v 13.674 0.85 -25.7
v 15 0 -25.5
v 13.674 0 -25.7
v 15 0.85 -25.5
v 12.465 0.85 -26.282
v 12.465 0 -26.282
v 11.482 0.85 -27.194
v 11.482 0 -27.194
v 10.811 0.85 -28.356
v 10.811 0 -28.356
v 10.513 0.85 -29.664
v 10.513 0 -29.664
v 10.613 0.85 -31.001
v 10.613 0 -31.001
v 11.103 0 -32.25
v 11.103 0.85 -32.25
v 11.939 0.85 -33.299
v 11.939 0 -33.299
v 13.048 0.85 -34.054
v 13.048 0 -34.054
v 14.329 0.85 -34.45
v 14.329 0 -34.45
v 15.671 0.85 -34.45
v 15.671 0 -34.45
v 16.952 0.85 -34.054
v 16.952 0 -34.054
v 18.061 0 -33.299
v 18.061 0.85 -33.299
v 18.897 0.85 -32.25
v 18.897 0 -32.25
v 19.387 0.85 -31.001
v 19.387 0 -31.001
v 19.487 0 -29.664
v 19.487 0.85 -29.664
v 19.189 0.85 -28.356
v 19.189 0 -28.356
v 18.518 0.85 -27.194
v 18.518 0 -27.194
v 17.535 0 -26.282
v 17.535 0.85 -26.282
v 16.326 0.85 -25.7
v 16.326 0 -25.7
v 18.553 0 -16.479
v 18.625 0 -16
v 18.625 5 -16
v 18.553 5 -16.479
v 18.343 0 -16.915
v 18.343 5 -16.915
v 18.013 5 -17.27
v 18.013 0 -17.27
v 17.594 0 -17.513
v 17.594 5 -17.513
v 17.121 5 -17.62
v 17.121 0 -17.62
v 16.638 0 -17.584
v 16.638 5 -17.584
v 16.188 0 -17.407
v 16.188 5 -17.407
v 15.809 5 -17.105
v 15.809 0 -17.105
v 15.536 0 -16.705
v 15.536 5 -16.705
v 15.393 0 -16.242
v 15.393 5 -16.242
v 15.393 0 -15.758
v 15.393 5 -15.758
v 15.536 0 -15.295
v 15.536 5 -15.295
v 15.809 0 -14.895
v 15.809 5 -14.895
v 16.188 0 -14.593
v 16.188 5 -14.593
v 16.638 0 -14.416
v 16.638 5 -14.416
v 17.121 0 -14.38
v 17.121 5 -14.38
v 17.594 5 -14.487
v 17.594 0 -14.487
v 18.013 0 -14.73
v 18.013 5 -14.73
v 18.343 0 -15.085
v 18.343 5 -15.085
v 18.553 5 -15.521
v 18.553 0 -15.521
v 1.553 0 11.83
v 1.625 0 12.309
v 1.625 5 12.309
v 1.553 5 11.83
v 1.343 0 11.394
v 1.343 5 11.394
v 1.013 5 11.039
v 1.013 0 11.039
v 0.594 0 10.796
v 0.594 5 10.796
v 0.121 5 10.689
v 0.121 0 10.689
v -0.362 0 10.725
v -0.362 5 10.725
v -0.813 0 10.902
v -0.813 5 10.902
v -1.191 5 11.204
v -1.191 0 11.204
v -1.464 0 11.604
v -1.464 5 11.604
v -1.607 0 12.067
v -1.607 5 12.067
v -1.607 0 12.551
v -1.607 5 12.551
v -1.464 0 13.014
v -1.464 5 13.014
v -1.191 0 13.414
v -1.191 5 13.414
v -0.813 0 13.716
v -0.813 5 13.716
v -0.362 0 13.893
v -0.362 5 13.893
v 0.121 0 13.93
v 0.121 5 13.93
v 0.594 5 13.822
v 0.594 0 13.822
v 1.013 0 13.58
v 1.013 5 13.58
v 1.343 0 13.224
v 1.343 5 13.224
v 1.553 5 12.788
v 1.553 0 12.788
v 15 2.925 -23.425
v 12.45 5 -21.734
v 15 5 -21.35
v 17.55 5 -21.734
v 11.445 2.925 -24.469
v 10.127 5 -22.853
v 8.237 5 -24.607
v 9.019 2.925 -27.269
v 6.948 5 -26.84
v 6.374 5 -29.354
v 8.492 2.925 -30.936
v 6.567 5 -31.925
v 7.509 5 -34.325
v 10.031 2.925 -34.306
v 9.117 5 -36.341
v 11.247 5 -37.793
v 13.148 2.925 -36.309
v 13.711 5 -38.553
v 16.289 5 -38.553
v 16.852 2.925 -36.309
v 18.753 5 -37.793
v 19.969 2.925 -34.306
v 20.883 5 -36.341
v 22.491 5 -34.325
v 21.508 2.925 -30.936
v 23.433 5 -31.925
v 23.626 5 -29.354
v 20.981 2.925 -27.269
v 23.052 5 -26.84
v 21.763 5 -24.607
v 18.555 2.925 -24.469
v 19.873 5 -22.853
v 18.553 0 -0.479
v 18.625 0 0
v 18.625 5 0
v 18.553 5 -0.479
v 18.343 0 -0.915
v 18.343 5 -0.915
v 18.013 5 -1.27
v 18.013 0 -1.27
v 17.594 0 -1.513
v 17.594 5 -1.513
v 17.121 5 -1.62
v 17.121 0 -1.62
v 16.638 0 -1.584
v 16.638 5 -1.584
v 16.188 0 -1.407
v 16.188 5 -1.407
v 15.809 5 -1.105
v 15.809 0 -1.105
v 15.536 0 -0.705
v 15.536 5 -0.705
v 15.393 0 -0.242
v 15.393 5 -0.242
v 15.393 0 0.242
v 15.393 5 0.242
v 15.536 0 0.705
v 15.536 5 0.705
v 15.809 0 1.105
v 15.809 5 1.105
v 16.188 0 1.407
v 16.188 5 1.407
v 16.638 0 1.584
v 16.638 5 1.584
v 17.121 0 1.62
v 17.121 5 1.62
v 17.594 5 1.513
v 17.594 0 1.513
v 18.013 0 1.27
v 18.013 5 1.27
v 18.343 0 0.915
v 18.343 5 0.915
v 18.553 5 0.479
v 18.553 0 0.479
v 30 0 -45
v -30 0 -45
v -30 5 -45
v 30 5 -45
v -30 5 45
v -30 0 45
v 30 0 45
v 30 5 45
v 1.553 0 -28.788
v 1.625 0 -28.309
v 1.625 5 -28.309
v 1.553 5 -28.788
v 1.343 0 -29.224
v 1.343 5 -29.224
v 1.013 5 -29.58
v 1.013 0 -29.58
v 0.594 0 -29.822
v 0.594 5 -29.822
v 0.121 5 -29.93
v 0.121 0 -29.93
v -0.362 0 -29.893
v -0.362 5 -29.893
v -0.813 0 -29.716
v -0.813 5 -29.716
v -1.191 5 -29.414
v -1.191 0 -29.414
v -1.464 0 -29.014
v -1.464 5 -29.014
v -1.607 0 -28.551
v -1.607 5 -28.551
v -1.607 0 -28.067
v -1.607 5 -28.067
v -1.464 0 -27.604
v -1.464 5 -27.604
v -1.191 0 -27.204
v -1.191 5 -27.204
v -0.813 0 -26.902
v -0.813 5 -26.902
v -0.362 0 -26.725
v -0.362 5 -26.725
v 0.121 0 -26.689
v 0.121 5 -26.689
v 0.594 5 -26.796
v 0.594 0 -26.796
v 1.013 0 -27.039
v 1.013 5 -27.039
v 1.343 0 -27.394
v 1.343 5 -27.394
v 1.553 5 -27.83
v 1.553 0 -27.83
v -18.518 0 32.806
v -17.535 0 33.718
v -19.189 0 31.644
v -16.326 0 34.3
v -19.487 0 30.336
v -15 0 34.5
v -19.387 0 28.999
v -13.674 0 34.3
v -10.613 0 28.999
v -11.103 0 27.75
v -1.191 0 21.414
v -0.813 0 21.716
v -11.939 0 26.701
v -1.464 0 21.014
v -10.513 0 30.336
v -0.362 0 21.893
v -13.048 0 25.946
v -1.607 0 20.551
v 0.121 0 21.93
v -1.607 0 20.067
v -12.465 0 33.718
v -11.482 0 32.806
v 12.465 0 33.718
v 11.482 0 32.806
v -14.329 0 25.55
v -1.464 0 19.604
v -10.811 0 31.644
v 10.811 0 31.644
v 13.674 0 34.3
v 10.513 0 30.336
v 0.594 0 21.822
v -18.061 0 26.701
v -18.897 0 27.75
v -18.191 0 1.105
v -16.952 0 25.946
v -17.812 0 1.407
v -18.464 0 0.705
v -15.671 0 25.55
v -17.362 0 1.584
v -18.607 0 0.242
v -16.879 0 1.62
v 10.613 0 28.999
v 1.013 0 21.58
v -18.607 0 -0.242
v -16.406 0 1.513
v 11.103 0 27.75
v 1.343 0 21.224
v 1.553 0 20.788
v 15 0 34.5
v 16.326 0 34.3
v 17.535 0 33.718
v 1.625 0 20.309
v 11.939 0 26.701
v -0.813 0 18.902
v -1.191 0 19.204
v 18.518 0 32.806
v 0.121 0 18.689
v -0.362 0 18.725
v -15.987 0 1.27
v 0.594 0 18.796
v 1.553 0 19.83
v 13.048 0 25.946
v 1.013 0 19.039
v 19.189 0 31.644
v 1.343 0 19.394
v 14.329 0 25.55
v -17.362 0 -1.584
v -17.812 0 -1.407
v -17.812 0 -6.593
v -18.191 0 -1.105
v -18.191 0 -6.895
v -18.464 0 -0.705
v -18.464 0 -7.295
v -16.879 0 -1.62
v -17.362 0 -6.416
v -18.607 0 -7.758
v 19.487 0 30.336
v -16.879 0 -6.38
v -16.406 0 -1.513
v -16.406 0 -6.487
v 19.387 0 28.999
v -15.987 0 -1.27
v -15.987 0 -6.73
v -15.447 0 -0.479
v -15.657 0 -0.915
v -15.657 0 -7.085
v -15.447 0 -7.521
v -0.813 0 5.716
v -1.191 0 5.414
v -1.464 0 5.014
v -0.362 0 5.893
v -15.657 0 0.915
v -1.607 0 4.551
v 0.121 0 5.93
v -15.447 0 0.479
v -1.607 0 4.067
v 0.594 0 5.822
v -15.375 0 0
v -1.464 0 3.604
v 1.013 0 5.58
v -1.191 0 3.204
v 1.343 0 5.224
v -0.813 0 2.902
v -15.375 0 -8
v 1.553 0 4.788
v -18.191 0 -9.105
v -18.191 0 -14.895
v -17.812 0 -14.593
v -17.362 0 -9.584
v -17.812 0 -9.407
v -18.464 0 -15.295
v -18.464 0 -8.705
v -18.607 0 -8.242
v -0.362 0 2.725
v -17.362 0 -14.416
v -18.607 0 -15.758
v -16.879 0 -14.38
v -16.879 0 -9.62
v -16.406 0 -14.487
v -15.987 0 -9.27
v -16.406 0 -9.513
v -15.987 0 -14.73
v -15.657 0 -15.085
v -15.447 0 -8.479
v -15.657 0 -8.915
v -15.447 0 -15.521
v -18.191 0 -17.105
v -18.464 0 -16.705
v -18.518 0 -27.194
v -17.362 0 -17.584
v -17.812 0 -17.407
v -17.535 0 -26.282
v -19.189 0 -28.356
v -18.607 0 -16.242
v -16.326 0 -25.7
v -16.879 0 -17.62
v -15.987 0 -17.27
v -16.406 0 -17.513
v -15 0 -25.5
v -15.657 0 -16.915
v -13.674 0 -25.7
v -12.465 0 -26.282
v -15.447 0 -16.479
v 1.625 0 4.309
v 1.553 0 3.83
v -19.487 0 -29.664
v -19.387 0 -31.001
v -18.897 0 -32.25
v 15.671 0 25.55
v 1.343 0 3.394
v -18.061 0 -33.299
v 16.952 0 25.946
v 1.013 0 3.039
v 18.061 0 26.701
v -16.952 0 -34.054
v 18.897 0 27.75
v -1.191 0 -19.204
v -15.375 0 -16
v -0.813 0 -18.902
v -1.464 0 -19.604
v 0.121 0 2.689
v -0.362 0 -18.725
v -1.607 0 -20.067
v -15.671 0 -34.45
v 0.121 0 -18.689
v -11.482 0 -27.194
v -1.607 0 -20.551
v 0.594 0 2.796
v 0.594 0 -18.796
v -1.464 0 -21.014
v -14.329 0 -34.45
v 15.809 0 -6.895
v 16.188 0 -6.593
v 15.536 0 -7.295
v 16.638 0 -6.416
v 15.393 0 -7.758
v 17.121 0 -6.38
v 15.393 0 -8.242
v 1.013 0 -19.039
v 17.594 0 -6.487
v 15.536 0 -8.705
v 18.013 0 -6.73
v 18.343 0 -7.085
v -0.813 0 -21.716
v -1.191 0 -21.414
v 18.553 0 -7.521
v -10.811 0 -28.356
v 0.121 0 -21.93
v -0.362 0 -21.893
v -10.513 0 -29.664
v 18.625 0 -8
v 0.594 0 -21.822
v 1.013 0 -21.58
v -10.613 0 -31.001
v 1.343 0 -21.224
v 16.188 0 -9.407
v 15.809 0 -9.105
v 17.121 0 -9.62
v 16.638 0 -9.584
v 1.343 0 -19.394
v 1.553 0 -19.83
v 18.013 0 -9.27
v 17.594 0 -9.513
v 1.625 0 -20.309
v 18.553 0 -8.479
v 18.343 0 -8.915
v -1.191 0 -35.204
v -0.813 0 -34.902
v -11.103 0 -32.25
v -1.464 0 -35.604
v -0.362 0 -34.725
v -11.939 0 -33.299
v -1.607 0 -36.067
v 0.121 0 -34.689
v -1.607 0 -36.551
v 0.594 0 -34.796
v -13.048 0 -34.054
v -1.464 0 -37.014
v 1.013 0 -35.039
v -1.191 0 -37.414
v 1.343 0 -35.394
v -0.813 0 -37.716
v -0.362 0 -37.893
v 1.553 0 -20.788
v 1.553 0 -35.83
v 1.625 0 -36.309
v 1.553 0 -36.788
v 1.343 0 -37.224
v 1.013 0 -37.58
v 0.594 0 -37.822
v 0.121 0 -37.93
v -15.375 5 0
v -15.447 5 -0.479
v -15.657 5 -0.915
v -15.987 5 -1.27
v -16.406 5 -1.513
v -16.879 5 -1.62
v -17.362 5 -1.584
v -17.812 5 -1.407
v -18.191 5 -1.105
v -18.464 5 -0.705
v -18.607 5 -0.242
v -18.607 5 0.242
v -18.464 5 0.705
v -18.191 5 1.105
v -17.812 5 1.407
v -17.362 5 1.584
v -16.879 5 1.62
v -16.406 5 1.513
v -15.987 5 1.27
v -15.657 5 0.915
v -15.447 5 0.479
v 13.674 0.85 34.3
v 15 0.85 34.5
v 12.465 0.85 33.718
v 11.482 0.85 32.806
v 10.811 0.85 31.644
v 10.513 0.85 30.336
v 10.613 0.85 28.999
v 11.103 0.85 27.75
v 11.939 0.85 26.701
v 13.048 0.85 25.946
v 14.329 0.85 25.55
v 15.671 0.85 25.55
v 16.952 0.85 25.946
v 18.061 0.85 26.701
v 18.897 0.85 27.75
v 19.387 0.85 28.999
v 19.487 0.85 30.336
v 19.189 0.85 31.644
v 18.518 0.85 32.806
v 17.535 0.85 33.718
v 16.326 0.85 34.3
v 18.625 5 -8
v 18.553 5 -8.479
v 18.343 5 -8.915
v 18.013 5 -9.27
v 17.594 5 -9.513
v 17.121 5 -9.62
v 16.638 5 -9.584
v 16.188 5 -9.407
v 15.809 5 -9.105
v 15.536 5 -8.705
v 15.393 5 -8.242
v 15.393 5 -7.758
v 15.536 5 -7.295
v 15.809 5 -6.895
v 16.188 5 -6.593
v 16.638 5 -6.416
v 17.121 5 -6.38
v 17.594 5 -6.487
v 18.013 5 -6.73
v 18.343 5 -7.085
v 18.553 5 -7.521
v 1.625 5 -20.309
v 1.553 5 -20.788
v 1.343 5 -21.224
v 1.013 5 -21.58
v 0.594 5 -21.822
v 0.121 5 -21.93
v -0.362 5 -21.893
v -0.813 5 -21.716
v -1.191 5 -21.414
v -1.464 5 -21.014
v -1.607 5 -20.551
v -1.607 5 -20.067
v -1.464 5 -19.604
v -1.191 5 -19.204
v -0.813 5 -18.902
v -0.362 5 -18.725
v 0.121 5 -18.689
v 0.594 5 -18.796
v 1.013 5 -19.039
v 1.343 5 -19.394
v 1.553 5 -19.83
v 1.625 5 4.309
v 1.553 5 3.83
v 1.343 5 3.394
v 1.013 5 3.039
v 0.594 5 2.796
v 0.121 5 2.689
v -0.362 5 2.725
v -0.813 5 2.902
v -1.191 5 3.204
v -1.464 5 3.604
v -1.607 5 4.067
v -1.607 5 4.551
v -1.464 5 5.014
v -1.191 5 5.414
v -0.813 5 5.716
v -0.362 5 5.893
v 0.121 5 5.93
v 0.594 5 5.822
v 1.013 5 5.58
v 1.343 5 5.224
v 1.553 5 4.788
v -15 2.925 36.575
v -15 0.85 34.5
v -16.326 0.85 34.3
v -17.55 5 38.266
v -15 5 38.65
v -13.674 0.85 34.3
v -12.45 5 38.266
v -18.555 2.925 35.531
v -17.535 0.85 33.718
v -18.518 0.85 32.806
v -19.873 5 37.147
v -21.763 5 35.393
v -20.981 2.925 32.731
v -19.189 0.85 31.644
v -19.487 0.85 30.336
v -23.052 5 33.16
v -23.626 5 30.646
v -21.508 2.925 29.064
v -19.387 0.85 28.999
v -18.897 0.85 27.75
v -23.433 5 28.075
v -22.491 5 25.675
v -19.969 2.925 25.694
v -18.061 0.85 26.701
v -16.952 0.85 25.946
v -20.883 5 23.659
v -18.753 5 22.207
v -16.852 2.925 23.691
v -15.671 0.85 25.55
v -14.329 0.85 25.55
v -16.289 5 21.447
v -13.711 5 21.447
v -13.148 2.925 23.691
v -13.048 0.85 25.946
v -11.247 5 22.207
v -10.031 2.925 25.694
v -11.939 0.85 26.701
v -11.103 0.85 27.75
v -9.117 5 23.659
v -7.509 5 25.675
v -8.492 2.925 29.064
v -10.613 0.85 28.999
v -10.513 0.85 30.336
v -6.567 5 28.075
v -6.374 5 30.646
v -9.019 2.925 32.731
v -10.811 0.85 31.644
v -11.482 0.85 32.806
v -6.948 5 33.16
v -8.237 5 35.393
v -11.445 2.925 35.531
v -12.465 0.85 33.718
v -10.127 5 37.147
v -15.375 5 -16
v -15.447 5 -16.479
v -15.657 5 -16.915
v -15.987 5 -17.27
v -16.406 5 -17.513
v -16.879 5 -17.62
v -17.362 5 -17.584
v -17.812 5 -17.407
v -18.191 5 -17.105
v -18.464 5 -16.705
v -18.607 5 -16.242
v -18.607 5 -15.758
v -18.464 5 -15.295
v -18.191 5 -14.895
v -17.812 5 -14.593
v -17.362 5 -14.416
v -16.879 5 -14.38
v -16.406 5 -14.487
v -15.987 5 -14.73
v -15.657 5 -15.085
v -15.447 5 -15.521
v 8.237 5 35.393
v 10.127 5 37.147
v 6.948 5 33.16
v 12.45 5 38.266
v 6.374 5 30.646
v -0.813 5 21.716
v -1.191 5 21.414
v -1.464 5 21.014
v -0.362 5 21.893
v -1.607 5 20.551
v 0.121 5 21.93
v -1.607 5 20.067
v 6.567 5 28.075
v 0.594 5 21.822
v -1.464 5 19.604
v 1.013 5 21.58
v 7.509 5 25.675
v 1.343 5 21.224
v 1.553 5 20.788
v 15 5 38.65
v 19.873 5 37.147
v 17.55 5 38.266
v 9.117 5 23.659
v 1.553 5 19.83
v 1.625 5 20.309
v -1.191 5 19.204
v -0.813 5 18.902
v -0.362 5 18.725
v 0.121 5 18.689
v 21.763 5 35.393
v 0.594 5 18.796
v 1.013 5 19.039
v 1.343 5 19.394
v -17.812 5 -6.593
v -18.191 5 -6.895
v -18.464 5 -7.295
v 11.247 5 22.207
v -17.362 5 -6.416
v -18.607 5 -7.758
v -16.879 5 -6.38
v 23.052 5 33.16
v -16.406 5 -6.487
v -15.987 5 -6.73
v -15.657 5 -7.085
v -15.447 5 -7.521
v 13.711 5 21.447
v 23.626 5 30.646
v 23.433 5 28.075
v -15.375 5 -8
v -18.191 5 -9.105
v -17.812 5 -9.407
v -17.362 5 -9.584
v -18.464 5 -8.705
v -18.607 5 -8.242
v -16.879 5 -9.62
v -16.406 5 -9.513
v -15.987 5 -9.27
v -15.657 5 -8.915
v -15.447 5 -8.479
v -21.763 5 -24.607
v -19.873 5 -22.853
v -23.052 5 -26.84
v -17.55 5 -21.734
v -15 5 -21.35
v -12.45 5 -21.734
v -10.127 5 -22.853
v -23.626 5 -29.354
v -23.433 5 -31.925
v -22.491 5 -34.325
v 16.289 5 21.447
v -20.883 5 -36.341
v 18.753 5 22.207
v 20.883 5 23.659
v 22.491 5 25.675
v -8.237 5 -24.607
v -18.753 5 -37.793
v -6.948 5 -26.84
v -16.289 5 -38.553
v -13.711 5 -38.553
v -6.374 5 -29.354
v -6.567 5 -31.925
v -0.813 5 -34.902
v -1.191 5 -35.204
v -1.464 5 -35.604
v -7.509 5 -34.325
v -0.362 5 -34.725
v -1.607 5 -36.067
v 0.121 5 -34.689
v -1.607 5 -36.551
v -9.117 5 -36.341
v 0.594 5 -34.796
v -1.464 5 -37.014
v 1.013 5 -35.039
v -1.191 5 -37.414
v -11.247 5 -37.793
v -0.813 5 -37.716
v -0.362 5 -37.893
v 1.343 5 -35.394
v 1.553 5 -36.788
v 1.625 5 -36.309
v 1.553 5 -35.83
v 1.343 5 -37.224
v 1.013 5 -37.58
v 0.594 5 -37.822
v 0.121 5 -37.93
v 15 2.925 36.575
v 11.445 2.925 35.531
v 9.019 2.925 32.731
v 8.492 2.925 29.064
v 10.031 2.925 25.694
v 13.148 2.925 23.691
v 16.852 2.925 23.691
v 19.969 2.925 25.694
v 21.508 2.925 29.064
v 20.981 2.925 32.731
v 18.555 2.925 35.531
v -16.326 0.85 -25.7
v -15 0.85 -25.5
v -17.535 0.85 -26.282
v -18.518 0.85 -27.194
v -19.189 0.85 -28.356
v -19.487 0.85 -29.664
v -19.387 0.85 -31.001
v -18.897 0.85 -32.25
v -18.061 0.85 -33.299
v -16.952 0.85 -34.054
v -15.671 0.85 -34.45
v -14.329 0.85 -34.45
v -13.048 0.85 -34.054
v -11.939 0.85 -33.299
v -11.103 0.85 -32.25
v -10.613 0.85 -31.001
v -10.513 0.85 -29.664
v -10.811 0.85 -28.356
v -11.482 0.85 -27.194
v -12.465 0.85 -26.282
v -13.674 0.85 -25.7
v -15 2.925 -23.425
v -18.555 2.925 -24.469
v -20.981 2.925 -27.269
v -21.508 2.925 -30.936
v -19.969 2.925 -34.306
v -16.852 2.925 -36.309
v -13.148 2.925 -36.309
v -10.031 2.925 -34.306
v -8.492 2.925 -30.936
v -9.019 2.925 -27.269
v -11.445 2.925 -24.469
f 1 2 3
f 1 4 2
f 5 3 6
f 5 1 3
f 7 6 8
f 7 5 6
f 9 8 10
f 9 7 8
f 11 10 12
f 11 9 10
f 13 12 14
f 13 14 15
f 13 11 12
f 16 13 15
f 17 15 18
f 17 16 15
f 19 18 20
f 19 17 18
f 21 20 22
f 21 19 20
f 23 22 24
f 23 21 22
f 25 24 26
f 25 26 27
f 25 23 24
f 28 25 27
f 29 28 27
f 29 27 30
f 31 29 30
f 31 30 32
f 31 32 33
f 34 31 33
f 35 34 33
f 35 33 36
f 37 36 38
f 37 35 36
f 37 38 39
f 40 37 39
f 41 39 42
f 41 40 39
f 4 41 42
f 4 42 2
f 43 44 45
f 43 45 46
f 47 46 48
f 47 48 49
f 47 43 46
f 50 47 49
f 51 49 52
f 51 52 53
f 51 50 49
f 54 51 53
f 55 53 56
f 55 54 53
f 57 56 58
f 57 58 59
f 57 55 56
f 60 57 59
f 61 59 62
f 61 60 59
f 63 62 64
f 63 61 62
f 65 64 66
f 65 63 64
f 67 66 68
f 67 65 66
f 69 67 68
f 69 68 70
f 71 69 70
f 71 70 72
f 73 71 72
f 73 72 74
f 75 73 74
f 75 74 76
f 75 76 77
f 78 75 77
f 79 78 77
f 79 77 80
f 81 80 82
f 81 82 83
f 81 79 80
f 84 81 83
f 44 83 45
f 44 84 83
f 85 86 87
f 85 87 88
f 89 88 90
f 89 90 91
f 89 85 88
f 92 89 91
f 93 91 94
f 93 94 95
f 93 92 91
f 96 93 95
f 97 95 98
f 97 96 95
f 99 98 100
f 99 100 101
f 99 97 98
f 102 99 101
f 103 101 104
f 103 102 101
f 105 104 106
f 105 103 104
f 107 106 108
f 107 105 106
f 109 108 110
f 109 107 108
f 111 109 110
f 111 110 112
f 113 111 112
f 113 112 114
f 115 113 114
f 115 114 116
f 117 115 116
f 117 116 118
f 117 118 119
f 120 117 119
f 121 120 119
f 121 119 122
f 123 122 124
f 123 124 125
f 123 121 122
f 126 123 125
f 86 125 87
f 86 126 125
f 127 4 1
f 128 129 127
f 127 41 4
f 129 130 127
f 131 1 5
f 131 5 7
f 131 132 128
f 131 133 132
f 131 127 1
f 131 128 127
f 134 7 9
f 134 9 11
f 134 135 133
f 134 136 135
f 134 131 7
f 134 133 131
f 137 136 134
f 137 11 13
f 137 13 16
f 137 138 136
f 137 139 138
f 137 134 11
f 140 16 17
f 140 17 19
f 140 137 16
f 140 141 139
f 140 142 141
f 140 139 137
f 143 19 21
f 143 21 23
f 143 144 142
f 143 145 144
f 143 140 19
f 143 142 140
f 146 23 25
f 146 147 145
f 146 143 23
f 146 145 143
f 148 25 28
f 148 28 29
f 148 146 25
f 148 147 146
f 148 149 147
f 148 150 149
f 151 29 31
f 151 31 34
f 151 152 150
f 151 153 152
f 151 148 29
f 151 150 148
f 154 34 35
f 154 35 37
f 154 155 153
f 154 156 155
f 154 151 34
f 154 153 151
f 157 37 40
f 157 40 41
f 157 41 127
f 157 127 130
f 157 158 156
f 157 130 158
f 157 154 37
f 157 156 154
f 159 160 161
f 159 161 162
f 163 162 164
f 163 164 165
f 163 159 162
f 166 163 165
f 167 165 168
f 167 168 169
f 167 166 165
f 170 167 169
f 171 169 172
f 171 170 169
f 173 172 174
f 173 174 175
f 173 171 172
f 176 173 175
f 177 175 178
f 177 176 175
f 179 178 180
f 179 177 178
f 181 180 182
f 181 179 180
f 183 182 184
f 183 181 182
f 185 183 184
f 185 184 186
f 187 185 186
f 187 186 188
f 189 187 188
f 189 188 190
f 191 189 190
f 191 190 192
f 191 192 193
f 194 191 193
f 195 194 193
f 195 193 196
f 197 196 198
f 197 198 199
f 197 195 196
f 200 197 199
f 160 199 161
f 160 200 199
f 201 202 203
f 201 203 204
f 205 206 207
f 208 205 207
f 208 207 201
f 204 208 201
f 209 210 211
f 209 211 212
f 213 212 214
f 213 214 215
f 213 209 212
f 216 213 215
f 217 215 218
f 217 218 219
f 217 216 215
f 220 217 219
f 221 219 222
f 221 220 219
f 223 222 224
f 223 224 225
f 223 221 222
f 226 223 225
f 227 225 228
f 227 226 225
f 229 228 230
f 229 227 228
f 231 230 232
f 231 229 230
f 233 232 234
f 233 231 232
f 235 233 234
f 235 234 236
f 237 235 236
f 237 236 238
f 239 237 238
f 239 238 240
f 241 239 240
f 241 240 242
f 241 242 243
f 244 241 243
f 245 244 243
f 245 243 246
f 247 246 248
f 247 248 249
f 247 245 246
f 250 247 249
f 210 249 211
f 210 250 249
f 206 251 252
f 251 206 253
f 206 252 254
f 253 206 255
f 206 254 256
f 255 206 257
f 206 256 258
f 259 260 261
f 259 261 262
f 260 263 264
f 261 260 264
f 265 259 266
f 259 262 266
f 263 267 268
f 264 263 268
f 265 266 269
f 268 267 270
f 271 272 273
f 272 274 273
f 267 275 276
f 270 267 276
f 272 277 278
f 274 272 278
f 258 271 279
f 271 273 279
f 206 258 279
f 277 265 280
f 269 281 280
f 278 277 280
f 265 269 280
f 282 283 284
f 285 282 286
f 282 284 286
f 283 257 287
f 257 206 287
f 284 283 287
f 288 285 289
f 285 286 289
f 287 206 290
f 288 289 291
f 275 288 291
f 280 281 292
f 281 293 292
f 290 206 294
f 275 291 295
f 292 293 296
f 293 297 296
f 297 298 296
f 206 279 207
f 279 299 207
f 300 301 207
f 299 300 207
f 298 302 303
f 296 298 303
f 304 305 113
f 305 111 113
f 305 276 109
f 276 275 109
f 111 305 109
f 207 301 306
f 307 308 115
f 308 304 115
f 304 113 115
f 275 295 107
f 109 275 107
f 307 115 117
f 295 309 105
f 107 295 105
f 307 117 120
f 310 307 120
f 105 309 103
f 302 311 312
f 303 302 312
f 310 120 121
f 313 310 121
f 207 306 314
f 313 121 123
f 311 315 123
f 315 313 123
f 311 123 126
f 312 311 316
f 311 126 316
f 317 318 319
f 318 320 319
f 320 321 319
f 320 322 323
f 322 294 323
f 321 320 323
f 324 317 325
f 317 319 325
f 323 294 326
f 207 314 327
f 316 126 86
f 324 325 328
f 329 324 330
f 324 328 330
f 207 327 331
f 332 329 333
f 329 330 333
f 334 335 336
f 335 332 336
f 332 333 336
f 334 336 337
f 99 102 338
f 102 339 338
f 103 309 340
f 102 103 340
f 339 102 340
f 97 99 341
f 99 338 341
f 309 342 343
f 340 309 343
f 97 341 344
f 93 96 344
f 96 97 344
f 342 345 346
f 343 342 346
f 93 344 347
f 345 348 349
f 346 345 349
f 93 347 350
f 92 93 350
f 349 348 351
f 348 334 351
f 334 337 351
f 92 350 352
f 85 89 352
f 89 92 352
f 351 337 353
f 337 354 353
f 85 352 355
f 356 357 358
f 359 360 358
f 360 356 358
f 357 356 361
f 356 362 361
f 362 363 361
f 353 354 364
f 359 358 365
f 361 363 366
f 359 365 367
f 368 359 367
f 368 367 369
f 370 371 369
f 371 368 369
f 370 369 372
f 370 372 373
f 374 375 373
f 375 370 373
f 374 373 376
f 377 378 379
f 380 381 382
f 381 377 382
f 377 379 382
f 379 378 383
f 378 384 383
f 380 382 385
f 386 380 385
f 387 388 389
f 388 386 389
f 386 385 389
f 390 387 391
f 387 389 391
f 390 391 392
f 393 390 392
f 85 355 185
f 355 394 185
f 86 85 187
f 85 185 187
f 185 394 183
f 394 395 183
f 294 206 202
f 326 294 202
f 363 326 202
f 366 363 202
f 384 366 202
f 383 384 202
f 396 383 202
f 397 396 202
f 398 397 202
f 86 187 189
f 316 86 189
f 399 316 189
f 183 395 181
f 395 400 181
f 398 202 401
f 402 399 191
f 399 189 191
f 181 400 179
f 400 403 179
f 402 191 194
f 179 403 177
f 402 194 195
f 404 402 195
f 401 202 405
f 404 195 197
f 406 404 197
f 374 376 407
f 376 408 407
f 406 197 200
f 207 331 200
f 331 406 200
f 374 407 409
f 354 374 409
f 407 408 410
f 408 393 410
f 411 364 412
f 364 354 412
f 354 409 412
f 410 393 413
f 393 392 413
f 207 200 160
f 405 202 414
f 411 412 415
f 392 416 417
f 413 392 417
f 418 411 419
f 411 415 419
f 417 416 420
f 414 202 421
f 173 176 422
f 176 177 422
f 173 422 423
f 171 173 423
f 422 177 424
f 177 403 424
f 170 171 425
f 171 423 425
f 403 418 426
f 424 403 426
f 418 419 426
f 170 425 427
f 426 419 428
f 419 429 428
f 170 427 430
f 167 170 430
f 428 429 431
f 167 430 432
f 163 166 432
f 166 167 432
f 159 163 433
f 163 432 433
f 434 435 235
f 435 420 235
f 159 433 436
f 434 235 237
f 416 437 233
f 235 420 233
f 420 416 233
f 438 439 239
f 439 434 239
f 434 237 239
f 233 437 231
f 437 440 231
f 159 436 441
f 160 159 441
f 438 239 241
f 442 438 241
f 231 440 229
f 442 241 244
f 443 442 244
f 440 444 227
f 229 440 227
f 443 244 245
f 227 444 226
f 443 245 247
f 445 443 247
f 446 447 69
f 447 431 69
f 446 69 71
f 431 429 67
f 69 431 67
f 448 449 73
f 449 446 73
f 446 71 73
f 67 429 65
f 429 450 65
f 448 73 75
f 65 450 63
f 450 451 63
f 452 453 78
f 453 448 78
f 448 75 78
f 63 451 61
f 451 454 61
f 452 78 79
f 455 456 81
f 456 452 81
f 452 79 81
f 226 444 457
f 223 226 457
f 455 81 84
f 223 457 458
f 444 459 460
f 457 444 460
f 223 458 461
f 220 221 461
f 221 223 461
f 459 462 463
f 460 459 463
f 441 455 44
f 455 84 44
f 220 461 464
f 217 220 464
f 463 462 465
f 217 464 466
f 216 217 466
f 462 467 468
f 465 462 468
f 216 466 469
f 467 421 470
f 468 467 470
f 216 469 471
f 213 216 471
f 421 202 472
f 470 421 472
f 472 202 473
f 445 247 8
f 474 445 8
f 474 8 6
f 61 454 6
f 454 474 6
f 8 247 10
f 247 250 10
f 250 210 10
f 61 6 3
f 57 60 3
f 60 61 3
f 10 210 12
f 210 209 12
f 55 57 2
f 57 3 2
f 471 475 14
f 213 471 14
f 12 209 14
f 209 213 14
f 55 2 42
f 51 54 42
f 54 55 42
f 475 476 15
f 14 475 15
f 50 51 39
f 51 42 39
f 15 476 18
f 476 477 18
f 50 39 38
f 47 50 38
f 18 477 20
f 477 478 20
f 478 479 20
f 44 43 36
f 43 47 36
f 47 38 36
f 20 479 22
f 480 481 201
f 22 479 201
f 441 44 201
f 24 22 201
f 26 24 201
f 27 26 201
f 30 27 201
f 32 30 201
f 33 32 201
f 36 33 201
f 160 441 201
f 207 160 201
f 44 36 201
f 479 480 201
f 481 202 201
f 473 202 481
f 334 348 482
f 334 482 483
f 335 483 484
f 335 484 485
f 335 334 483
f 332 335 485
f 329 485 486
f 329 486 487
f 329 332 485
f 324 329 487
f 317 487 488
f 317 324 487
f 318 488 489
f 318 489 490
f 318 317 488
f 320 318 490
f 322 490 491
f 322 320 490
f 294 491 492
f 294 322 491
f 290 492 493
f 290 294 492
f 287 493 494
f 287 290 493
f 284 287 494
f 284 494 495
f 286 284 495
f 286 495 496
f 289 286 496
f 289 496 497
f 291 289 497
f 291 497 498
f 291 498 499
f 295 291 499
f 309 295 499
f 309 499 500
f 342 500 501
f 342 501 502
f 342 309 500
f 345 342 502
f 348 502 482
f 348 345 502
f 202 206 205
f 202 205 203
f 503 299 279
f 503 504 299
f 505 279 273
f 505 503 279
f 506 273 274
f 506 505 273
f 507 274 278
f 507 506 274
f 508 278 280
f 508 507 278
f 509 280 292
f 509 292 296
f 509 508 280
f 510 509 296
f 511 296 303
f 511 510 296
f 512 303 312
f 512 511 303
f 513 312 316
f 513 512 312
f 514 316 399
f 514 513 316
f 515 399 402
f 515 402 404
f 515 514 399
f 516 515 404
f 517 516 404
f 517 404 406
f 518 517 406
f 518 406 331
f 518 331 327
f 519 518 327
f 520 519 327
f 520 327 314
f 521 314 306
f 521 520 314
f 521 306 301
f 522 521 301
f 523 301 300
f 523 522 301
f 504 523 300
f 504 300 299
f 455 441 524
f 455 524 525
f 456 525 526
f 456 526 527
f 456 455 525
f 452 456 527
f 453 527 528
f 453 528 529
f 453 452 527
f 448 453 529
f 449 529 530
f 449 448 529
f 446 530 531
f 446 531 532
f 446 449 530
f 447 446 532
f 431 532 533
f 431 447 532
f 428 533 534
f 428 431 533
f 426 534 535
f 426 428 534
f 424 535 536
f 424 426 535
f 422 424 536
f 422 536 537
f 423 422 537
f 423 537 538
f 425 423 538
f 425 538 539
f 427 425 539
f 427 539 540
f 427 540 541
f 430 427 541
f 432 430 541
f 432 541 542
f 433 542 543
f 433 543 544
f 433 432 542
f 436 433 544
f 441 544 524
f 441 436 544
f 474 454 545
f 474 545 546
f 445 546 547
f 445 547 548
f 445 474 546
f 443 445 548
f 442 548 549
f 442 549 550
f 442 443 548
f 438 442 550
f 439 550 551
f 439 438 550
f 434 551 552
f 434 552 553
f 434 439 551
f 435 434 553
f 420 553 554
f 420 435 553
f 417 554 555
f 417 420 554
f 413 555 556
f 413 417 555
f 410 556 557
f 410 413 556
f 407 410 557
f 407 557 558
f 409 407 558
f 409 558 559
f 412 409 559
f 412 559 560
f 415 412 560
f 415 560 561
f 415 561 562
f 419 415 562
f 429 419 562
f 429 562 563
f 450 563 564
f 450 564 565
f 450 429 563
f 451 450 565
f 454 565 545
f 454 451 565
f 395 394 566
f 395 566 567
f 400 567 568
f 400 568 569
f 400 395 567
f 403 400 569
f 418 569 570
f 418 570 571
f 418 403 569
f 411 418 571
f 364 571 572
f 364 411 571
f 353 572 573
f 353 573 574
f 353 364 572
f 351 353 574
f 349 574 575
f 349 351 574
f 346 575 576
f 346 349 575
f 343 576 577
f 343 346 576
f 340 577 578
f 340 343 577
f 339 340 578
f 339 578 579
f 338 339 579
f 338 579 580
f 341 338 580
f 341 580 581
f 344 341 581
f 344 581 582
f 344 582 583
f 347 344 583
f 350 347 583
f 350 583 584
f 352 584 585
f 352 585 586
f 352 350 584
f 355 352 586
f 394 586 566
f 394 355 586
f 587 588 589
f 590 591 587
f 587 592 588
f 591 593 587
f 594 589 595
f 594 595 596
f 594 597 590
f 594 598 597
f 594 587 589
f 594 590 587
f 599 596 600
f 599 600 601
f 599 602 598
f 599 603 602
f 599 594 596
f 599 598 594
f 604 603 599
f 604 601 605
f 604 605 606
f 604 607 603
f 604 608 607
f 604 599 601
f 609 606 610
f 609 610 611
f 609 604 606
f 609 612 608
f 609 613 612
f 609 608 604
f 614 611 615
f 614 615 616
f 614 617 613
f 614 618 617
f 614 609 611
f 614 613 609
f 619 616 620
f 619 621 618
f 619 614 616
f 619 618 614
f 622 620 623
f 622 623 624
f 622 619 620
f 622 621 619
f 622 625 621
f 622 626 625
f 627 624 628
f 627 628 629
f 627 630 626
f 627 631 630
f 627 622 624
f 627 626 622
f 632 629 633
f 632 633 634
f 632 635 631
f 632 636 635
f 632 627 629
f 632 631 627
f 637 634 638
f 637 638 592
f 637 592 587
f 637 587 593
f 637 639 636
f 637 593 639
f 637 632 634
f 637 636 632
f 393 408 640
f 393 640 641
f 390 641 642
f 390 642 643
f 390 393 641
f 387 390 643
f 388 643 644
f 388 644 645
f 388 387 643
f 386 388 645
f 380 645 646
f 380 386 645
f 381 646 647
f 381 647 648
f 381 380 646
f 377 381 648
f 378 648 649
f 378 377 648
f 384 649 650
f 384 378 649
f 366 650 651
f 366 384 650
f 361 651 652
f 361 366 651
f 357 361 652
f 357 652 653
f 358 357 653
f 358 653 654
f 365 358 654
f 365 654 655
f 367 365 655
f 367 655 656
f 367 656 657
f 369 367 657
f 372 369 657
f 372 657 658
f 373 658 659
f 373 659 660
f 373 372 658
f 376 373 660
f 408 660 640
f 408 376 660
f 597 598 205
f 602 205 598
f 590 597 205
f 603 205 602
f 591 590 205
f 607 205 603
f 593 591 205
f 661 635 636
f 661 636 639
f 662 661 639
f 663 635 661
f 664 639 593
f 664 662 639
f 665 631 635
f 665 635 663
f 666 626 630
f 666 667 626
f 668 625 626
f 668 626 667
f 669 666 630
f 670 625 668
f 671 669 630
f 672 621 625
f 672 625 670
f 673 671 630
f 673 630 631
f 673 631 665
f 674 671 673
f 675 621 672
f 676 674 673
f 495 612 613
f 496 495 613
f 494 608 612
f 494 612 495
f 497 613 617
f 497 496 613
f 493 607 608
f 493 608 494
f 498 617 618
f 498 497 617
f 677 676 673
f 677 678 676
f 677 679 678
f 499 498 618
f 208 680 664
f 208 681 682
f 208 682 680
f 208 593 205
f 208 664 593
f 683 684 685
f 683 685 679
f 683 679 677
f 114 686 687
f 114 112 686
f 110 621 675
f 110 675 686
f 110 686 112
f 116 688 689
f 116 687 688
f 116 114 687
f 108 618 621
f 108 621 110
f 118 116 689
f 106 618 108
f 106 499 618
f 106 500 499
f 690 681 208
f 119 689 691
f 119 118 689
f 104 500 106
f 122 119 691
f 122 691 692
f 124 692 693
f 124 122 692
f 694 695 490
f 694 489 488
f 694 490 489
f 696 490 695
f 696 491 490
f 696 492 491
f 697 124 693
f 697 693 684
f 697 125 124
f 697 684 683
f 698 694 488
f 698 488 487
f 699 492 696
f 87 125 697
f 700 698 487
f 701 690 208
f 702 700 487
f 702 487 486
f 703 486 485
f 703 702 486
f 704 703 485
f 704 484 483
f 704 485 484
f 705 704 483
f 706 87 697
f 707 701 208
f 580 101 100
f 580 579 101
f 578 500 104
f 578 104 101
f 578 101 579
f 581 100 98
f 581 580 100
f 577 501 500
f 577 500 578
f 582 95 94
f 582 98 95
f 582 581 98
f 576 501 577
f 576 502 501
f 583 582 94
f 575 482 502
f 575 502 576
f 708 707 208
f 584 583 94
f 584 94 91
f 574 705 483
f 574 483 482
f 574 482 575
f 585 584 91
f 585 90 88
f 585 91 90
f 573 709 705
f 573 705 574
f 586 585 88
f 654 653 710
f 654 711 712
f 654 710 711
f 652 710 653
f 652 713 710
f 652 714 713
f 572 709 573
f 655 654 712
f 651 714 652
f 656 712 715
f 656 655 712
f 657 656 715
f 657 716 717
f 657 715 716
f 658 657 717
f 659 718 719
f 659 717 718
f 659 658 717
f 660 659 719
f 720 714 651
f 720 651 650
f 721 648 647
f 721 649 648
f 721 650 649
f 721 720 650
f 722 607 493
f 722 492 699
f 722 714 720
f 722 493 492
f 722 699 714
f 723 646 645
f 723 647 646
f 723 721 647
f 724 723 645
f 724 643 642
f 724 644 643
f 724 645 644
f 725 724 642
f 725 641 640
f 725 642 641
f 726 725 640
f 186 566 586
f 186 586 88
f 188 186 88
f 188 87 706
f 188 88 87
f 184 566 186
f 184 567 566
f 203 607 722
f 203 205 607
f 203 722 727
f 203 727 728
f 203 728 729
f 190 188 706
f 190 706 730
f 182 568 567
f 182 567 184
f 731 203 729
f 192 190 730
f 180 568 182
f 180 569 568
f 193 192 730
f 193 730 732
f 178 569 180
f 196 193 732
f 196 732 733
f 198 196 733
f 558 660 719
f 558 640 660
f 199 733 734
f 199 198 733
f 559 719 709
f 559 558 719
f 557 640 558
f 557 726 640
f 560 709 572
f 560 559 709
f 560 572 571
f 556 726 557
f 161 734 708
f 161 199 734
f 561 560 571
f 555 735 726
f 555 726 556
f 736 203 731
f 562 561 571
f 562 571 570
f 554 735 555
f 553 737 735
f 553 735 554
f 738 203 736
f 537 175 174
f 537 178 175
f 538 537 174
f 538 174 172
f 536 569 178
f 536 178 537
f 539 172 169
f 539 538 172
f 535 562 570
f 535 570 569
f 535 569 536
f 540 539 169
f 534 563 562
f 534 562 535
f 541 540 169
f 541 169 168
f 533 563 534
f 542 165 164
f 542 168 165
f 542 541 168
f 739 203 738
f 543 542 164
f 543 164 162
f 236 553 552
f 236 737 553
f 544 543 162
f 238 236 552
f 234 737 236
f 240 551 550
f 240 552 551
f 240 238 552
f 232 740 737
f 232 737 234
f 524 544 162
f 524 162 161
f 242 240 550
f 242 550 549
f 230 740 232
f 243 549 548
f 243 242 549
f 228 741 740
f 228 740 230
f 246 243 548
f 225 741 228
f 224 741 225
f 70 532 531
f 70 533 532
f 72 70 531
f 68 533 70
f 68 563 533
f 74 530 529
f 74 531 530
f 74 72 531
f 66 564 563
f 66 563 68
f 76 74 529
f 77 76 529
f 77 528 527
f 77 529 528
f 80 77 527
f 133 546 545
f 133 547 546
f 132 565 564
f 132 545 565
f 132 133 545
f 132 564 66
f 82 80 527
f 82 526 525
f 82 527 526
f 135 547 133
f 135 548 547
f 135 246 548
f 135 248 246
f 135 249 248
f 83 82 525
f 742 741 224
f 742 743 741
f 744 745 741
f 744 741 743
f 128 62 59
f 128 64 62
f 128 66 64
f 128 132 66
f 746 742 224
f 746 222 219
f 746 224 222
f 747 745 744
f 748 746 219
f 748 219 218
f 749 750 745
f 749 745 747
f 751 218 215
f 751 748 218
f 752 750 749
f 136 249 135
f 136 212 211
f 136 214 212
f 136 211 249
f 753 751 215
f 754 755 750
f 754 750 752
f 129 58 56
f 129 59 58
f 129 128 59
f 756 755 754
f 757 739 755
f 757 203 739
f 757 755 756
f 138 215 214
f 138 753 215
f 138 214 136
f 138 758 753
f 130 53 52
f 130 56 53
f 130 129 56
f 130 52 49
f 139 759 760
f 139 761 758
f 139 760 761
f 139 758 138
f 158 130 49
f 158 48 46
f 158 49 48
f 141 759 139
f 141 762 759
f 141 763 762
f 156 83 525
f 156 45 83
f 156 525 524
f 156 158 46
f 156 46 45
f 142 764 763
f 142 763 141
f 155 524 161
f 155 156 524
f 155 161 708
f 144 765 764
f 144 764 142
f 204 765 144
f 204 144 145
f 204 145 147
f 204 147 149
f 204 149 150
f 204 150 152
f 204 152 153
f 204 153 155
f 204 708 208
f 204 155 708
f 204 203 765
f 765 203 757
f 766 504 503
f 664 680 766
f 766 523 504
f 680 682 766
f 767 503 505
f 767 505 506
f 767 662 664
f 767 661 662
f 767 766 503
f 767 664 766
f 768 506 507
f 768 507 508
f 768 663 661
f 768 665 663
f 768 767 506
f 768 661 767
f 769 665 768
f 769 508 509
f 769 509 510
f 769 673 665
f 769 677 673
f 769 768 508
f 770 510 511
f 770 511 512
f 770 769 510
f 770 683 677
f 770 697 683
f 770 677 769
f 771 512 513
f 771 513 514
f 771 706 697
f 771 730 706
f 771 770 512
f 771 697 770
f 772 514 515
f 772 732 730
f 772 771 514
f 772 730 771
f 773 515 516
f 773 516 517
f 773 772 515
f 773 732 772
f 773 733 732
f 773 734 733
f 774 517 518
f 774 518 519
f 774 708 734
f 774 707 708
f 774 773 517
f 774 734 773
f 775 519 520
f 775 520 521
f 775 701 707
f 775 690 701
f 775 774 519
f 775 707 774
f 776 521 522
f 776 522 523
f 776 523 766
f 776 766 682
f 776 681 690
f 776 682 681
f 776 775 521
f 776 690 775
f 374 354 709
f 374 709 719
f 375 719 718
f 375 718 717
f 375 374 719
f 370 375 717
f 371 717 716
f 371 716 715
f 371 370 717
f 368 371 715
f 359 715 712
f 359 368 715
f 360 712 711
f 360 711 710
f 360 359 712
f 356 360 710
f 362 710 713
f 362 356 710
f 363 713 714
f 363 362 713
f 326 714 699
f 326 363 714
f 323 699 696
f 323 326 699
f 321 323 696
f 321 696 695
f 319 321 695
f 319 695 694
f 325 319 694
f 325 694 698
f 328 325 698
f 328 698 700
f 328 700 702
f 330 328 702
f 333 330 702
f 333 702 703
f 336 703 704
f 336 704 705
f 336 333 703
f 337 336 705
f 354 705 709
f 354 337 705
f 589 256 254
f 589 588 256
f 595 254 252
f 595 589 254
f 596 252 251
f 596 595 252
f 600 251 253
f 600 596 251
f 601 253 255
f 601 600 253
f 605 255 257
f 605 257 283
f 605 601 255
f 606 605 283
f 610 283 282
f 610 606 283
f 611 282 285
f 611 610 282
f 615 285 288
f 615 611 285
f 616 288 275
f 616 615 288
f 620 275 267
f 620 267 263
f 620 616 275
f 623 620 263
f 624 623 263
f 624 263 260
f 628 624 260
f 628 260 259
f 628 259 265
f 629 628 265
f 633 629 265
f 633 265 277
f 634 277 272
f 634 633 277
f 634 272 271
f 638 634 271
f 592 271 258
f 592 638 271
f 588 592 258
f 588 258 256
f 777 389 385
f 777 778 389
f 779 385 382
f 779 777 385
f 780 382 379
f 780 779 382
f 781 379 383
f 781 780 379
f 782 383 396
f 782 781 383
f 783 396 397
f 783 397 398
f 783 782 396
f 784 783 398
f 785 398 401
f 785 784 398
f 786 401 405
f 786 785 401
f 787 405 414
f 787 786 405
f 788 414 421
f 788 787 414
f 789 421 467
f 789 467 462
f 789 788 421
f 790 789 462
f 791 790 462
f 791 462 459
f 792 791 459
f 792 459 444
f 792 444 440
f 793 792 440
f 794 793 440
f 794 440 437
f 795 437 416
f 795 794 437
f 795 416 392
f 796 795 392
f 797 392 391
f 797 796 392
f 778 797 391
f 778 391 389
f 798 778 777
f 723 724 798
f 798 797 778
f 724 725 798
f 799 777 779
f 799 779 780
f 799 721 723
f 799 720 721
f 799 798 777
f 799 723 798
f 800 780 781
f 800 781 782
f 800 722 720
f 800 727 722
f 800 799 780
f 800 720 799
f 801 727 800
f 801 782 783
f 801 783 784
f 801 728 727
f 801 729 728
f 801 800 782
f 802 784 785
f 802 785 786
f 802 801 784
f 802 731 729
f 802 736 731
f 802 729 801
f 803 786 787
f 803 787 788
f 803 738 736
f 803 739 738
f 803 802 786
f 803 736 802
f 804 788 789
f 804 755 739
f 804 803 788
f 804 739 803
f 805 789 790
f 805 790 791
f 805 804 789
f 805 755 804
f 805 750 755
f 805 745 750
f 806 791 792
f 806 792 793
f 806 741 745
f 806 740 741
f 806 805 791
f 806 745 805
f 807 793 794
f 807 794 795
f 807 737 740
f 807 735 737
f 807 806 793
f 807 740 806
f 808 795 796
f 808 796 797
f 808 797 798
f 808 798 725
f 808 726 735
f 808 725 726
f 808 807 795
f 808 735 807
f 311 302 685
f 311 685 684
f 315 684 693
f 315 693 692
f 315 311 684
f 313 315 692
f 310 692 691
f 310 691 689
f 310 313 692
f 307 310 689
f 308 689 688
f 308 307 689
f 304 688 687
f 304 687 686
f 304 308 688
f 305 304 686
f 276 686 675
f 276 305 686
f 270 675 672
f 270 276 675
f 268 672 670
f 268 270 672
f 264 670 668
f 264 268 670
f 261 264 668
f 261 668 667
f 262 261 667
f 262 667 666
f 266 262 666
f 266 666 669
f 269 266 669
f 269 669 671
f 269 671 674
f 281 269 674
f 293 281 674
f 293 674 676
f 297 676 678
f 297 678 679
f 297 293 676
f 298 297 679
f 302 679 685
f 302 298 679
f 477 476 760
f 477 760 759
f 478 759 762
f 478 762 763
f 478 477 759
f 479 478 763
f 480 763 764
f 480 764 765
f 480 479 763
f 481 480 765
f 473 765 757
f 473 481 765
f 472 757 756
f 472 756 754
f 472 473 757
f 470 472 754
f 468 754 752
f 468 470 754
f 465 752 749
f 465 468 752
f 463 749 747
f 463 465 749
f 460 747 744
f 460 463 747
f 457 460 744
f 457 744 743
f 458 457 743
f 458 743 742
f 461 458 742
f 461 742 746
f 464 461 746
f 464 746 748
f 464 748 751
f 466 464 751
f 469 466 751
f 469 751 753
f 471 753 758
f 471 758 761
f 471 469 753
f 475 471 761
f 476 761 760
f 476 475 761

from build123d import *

# Parameters (mm, degrees)
SKETCH2_W                                    = 60
SKETCH2_H                                    = 90
SKETCH2_R                                    = 1.625
BOSS_EXTRUDE1_DEPTH                          = 5
SKETCH3_R                                    = 3.375
CUT_EXTRUDE1_DEPTH                           = 5
CSK_FOR_M8_COUNTERSUNK_FLAT_HEAD_SCR_2_COUNT = 2
CSK_FOR_M8_COUNTERSUNK_FLAT_HEAD_SCR_2_PITCH = 30
CSK_FOR_M8_COUNTERSUNK_FLAT_HEAD_SCR_3_COUNT = 2
CSK_FOR_M8_COUNTERSUNK_FLAT_HEAD_SCR_3_PITCH = 60
CSK_FOR_M8_COUNTERSUNK_FLAT_HEAD_SCR_4_COUNT = 2
CSK_FOR_M8_COUNTERSUNK_FLAT_HEAD_SCR_4_PITCH = 67.082039325


with BuildPart() as part:
    # Sketch2 → Boss-Extrude1 (new body)
    with BuildSketch(Plane(origin=(0, 0, 0), x_dir=(1, 0, 0), z_dir=(0, 1, 0))):
        Rectangle(SKETCH2_W, SKETCH2_H)
        with Locations((0, 20.309068759)):
            Circle(SKETCH2_R, mode=Mode.SUBTRACT)
        with Locations((0, -20.309068759)):
            Circle(SKETCH2_R, mode=Mode.SUBTRACT)
        with Locations((17, 0)):
            Circle(SKETCH2_R, mode=Mode.SUBTRACT)
        with Locations((-17, 0)):
            Circle(SKETCH2_R, mode=Mode.SUBTRACT)
        with Locations((0, 28.309068759)):
            Circle(SKETCH2_R, mode=Mode.SUBTRACT)
        with Locations((17, 8)):
            Circle(SKETCH2_R, mode=Mode.SUBTRACT)
        with Locations((-17, 8)):
            Circle(SKETCH2_R, mode=Mode.SUBTRACT)
        with Locations((0, -12.309068759)):
            Circle(SKETCH2_R, mode=Mode.SUBTRACT)
        with Locations((0, 36.309068759)):
            Circle(SKETCH2_R, mode=Mode.SUBTRACT)
        with Locations((17, 16)):
            Circle(SKETCH2_R, mode=Mode.SUBTRACT)
        with Locations((-17, 16)):
            Circle(SKETCH2_R, mode=Mode.SUBTRACT)
        with Locations((0, -4.309068759)):
            Circle(SKETCH2_R, mode=Mode.SUBTRACT)
    extrude(amount=BOSS_EXTRUDE1_DEPTH)

    # Sketch3 → Cut-Extrude1 (cut)
    with BuildSketch(Plane(origin=(0, 5, 0), x_dir=(1, 0, 0), z_dir=(0, 1, 0))):
        with Locations((-15, 30)):
            Circle(SKETCH3_R)
        with Locations((15, 30)):
            Circle(SKETCH3_R)
        with Locations((15, -30)):
            Circle(SKETCH3_R)
        with Locations((-15, -30)):
            Circle(SKETCH3_R)
    extrude(amount=-CUT_EXTRUDE1_DEPTH, mode=Mode.SUBTRACT)

    # Sketch4 → CSK for M8 Countersunk Flat Head Screw1 (revolve, cut)
    with BuildSketch(Plane(origin=(-15, 5, 30), x_dir=(0, 0, 1), z_dir=(1, 0, 0))):
        Polygon((0, 0), (0, 5), (4.5, 5), (4.5, 4.15), (8.65, 0), align=None)
    csk_for_m8_countersunk_flat_head_screw1 = revolve(axis=Axis((-15, 11.35, 30), (0, -1, 0)), mode=Mode.SUBTRACT)

    # CSK for M8 Countersunk Flat Head Scr 2: CSK for M8 Countersunk Flat Head Screw1 ×2
    with Locations(*[(i * CSK_FOR_M8_COUNTERSUNK_FLAT_HEAD_SCR_2_PITCH, 0, 0) for i in range(1, CSK_FOR_M8_COUNTERSUNK_FLAT_HEAD_SCR_2_COUNT)]):
        add(csk_for_m8_countersunk_flat_head_screw1, mode=Mode.SUBTRACT)

    # CSK for M8 Countersunk Flat Head Scr 3: CSK for M8 Countersunk Flat Head Screw1 ×2
    with Locations(*[(0, 0, -i * CSK_FOR_M8_COUNTERSUNK_FLAT_HEAD_SCR_3_PITCH) for i in range(1, CSK_FOR_M8_COUNTERSUNK_FLAT_HEAD_SCR_3_COUNT)]):
        add(csk_for_m8_countersunk_flat_head_screw1, mode=Mode.SUBTRACT)

    # CSK for M8 Countersunk Flat Head Scr 4: CSK for M8 Countersunk Flat Head Screw1 ×2
    with Locations(*[Vector(0.447213595, 0, -0.894427191) * (i * CSK_FOR_M8_COUNTERSUNK_FLAT_HEAD_SCR_4_PITCH) for i in range(1, CSK_FOR_M8_COUNTERSUNK_FLAT_HEAD_SCR_4_COUNT)]):
        add(csk_for_m8_countersunk_flat_head_screw1, mode=Mode.SUBTRACT)


solid = part.part
